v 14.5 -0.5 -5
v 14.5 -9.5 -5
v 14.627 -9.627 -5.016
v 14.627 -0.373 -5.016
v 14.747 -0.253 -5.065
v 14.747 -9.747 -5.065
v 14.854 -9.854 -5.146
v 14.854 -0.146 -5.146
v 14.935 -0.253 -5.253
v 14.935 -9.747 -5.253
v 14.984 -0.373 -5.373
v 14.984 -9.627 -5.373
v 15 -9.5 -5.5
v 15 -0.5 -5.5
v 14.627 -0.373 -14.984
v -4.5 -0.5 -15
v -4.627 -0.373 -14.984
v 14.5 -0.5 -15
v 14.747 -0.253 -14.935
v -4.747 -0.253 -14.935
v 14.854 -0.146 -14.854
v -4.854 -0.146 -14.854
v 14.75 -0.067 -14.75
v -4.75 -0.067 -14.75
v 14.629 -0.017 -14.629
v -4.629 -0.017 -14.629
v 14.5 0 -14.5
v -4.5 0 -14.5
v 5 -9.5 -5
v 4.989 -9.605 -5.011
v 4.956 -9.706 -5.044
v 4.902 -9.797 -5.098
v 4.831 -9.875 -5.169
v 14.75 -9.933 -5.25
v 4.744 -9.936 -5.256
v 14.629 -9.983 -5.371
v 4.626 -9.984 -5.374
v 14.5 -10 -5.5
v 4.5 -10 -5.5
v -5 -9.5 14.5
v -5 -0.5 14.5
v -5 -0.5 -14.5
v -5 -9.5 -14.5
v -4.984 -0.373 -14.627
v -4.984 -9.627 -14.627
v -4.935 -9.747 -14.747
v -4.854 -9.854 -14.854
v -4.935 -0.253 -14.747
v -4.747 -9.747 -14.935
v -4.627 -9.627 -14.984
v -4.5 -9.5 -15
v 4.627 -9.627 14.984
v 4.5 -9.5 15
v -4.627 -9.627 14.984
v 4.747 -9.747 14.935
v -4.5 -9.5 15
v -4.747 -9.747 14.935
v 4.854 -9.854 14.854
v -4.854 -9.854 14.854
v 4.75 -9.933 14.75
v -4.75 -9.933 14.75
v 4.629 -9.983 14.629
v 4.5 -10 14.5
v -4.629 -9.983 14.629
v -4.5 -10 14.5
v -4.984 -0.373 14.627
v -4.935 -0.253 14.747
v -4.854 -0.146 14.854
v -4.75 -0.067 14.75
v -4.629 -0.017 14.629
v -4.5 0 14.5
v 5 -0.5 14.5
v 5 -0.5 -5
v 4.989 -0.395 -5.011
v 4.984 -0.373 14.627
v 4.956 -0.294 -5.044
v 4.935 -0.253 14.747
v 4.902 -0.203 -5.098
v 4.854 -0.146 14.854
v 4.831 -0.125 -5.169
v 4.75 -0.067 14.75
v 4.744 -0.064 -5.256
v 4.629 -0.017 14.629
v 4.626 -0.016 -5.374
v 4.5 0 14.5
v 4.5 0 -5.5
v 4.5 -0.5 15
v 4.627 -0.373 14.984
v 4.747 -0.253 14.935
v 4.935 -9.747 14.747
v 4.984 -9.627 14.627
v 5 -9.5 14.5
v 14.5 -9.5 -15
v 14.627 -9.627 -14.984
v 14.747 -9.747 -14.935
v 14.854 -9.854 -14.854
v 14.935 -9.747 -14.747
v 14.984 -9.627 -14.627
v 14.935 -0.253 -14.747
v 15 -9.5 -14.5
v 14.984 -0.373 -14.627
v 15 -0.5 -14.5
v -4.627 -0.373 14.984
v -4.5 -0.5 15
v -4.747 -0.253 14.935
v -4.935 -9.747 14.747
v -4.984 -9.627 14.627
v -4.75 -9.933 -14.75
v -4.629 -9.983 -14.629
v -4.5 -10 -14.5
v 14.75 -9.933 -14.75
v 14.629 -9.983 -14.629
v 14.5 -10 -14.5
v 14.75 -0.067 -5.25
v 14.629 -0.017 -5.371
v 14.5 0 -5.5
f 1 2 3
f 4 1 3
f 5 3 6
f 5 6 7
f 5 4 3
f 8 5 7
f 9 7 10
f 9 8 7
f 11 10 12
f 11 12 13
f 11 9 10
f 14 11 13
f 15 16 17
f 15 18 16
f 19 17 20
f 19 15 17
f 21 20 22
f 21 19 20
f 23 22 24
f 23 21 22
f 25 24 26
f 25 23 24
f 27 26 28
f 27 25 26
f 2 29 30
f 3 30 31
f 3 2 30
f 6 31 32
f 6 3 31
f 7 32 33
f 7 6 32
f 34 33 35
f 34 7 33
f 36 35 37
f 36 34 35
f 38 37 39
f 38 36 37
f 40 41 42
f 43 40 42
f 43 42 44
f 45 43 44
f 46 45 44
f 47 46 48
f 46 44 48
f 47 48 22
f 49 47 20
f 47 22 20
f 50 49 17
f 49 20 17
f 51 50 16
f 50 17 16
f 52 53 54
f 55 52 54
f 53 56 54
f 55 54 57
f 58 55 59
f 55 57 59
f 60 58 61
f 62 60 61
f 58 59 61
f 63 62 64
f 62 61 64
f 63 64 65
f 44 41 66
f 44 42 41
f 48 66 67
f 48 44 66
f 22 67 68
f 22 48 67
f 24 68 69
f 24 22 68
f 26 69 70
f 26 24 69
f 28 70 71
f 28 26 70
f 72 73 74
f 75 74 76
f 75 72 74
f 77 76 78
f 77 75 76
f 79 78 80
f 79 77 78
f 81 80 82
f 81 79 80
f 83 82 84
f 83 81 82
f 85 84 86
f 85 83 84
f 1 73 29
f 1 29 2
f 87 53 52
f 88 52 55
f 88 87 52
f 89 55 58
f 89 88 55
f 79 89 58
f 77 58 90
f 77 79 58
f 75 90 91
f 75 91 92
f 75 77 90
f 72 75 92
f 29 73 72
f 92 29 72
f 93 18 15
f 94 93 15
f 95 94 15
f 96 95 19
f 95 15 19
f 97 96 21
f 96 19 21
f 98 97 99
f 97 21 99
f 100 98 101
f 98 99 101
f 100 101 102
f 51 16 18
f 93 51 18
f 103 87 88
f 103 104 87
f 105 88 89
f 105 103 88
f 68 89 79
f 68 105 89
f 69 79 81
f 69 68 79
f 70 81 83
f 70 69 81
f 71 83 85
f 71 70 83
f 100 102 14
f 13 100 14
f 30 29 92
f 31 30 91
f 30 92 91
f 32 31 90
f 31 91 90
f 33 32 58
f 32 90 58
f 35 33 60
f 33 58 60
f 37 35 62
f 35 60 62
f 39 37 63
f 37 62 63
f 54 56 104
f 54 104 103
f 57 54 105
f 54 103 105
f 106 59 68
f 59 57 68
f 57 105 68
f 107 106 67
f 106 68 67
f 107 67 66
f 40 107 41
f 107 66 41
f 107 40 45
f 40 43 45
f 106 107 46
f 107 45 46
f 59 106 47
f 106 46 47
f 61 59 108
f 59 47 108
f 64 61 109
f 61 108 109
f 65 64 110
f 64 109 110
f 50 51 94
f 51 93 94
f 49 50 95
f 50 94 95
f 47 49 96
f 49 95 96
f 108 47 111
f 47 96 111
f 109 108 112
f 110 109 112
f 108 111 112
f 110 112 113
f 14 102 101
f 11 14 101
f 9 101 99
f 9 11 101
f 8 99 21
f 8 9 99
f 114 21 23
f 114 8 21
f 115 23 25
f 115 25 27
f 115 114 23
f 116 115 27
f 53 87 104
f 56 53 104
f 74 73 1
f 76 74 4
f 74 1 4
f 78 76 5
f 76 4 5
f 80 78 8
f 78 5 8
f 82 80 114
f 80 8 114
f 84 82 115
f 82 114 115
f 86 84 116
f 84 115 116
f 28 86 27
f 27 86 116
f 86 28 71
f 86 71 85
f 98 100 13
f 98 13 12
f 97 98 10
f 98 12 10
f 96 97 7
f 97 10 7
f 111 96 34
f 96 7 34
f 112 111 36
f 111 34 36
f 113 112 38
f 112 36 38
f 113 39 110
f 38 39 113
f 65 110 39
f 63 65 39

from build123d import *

# Parameters (mm, degrees)
F0_W        = 10
F0_H        = 10
F1_DEPTH    = 10
F2_R        = 0.5
F3_T1_DEPTH = 11.5


# Not quite as in the source:
# - a fillet or chamfer that OpenCascade refuses, or shapes differently, is made with other operations: its cross-section is extruded or revolved along the edge and cut away or added


with BuildPart() as f1:
    # F0 (on Front) → F1 (new body)
    with BuildSketch(Plane.XZ):
        Polygon((5, 15), (-5, 15), (-5, -15), (5, -15), (5, -5), align=None)
        with Locations((10, -10)):
            Rectangle(F0_W, F0_H)
    extrude(amount=F1_DEPTH)

    # F2
    f2_edges = [f1.edges().sort_by_distance(p)[0] for p in [
        (0, -10, 15),
        (-5, -10, 0),
        (5, -10, -15),
        (15, -10, -10),
        (10, -10, -5),
        (5, -10, 5),
        (0, 0, 15),
        (-5, 0, 0),
        (5, 0, -15),
        (15, 0, -10),
        (10, 0, -5),
        (5, 0, 5),
    ]]
    fillet(f2_edges, radius=F2_R)

    # F3: fillet of radius 0.5 on 11 edges, made by hand

    # F3_s2 → F3_t1 (cut)
    with BuildSketch(Plane.XZ.offset(-0.75)):
        with BuildLine():
            ThreePointArc((-5, -14.5), (-4.8535533906, -14.8535533906), (-4.5, -15))
            Line((-4.5, -15), (-5, -15))
            Line((-5, -15), (-5, -14.5))
        make_face()
        with BuildLine():
            ThreePointArc((14.5, -15), (14.8535533906, -14.8535533906), (15, -14.5))
            Line((15, -14.5), (15, -15))
            Line((15, -15), (14.5, -15))
        make_face()
        with BuildLine():
            ThreePointArc((4.5, 15), (4.8535533906, 14.8535533906), (5, 14.5))
            Line((5, 14.5), (5, 15))
            Line((5, 15), (4.5, 15))
        make_face()
        with BuildLine():
            ThreePointArc((-4.5, 15), (-4.8535533906, 14.8535533906), (-5, 14.5))
            Line((-5, 14.5), (-5, 15))
            Line((-5, 15), (-4.5, 15))
        make_face()
        with BuildLine():
            ThreePointArc((14.5, -5), (14.8535533906, -5.1464466094), (15, -5.5))
            Line((15, -5.5), (15, -5))
            Line((15, -5), (14.5, -5))
        make_face()
    extrude(amount=F3_T1_DEPTH, mode=Mode.SUBTRACT)


solid = f1.part
